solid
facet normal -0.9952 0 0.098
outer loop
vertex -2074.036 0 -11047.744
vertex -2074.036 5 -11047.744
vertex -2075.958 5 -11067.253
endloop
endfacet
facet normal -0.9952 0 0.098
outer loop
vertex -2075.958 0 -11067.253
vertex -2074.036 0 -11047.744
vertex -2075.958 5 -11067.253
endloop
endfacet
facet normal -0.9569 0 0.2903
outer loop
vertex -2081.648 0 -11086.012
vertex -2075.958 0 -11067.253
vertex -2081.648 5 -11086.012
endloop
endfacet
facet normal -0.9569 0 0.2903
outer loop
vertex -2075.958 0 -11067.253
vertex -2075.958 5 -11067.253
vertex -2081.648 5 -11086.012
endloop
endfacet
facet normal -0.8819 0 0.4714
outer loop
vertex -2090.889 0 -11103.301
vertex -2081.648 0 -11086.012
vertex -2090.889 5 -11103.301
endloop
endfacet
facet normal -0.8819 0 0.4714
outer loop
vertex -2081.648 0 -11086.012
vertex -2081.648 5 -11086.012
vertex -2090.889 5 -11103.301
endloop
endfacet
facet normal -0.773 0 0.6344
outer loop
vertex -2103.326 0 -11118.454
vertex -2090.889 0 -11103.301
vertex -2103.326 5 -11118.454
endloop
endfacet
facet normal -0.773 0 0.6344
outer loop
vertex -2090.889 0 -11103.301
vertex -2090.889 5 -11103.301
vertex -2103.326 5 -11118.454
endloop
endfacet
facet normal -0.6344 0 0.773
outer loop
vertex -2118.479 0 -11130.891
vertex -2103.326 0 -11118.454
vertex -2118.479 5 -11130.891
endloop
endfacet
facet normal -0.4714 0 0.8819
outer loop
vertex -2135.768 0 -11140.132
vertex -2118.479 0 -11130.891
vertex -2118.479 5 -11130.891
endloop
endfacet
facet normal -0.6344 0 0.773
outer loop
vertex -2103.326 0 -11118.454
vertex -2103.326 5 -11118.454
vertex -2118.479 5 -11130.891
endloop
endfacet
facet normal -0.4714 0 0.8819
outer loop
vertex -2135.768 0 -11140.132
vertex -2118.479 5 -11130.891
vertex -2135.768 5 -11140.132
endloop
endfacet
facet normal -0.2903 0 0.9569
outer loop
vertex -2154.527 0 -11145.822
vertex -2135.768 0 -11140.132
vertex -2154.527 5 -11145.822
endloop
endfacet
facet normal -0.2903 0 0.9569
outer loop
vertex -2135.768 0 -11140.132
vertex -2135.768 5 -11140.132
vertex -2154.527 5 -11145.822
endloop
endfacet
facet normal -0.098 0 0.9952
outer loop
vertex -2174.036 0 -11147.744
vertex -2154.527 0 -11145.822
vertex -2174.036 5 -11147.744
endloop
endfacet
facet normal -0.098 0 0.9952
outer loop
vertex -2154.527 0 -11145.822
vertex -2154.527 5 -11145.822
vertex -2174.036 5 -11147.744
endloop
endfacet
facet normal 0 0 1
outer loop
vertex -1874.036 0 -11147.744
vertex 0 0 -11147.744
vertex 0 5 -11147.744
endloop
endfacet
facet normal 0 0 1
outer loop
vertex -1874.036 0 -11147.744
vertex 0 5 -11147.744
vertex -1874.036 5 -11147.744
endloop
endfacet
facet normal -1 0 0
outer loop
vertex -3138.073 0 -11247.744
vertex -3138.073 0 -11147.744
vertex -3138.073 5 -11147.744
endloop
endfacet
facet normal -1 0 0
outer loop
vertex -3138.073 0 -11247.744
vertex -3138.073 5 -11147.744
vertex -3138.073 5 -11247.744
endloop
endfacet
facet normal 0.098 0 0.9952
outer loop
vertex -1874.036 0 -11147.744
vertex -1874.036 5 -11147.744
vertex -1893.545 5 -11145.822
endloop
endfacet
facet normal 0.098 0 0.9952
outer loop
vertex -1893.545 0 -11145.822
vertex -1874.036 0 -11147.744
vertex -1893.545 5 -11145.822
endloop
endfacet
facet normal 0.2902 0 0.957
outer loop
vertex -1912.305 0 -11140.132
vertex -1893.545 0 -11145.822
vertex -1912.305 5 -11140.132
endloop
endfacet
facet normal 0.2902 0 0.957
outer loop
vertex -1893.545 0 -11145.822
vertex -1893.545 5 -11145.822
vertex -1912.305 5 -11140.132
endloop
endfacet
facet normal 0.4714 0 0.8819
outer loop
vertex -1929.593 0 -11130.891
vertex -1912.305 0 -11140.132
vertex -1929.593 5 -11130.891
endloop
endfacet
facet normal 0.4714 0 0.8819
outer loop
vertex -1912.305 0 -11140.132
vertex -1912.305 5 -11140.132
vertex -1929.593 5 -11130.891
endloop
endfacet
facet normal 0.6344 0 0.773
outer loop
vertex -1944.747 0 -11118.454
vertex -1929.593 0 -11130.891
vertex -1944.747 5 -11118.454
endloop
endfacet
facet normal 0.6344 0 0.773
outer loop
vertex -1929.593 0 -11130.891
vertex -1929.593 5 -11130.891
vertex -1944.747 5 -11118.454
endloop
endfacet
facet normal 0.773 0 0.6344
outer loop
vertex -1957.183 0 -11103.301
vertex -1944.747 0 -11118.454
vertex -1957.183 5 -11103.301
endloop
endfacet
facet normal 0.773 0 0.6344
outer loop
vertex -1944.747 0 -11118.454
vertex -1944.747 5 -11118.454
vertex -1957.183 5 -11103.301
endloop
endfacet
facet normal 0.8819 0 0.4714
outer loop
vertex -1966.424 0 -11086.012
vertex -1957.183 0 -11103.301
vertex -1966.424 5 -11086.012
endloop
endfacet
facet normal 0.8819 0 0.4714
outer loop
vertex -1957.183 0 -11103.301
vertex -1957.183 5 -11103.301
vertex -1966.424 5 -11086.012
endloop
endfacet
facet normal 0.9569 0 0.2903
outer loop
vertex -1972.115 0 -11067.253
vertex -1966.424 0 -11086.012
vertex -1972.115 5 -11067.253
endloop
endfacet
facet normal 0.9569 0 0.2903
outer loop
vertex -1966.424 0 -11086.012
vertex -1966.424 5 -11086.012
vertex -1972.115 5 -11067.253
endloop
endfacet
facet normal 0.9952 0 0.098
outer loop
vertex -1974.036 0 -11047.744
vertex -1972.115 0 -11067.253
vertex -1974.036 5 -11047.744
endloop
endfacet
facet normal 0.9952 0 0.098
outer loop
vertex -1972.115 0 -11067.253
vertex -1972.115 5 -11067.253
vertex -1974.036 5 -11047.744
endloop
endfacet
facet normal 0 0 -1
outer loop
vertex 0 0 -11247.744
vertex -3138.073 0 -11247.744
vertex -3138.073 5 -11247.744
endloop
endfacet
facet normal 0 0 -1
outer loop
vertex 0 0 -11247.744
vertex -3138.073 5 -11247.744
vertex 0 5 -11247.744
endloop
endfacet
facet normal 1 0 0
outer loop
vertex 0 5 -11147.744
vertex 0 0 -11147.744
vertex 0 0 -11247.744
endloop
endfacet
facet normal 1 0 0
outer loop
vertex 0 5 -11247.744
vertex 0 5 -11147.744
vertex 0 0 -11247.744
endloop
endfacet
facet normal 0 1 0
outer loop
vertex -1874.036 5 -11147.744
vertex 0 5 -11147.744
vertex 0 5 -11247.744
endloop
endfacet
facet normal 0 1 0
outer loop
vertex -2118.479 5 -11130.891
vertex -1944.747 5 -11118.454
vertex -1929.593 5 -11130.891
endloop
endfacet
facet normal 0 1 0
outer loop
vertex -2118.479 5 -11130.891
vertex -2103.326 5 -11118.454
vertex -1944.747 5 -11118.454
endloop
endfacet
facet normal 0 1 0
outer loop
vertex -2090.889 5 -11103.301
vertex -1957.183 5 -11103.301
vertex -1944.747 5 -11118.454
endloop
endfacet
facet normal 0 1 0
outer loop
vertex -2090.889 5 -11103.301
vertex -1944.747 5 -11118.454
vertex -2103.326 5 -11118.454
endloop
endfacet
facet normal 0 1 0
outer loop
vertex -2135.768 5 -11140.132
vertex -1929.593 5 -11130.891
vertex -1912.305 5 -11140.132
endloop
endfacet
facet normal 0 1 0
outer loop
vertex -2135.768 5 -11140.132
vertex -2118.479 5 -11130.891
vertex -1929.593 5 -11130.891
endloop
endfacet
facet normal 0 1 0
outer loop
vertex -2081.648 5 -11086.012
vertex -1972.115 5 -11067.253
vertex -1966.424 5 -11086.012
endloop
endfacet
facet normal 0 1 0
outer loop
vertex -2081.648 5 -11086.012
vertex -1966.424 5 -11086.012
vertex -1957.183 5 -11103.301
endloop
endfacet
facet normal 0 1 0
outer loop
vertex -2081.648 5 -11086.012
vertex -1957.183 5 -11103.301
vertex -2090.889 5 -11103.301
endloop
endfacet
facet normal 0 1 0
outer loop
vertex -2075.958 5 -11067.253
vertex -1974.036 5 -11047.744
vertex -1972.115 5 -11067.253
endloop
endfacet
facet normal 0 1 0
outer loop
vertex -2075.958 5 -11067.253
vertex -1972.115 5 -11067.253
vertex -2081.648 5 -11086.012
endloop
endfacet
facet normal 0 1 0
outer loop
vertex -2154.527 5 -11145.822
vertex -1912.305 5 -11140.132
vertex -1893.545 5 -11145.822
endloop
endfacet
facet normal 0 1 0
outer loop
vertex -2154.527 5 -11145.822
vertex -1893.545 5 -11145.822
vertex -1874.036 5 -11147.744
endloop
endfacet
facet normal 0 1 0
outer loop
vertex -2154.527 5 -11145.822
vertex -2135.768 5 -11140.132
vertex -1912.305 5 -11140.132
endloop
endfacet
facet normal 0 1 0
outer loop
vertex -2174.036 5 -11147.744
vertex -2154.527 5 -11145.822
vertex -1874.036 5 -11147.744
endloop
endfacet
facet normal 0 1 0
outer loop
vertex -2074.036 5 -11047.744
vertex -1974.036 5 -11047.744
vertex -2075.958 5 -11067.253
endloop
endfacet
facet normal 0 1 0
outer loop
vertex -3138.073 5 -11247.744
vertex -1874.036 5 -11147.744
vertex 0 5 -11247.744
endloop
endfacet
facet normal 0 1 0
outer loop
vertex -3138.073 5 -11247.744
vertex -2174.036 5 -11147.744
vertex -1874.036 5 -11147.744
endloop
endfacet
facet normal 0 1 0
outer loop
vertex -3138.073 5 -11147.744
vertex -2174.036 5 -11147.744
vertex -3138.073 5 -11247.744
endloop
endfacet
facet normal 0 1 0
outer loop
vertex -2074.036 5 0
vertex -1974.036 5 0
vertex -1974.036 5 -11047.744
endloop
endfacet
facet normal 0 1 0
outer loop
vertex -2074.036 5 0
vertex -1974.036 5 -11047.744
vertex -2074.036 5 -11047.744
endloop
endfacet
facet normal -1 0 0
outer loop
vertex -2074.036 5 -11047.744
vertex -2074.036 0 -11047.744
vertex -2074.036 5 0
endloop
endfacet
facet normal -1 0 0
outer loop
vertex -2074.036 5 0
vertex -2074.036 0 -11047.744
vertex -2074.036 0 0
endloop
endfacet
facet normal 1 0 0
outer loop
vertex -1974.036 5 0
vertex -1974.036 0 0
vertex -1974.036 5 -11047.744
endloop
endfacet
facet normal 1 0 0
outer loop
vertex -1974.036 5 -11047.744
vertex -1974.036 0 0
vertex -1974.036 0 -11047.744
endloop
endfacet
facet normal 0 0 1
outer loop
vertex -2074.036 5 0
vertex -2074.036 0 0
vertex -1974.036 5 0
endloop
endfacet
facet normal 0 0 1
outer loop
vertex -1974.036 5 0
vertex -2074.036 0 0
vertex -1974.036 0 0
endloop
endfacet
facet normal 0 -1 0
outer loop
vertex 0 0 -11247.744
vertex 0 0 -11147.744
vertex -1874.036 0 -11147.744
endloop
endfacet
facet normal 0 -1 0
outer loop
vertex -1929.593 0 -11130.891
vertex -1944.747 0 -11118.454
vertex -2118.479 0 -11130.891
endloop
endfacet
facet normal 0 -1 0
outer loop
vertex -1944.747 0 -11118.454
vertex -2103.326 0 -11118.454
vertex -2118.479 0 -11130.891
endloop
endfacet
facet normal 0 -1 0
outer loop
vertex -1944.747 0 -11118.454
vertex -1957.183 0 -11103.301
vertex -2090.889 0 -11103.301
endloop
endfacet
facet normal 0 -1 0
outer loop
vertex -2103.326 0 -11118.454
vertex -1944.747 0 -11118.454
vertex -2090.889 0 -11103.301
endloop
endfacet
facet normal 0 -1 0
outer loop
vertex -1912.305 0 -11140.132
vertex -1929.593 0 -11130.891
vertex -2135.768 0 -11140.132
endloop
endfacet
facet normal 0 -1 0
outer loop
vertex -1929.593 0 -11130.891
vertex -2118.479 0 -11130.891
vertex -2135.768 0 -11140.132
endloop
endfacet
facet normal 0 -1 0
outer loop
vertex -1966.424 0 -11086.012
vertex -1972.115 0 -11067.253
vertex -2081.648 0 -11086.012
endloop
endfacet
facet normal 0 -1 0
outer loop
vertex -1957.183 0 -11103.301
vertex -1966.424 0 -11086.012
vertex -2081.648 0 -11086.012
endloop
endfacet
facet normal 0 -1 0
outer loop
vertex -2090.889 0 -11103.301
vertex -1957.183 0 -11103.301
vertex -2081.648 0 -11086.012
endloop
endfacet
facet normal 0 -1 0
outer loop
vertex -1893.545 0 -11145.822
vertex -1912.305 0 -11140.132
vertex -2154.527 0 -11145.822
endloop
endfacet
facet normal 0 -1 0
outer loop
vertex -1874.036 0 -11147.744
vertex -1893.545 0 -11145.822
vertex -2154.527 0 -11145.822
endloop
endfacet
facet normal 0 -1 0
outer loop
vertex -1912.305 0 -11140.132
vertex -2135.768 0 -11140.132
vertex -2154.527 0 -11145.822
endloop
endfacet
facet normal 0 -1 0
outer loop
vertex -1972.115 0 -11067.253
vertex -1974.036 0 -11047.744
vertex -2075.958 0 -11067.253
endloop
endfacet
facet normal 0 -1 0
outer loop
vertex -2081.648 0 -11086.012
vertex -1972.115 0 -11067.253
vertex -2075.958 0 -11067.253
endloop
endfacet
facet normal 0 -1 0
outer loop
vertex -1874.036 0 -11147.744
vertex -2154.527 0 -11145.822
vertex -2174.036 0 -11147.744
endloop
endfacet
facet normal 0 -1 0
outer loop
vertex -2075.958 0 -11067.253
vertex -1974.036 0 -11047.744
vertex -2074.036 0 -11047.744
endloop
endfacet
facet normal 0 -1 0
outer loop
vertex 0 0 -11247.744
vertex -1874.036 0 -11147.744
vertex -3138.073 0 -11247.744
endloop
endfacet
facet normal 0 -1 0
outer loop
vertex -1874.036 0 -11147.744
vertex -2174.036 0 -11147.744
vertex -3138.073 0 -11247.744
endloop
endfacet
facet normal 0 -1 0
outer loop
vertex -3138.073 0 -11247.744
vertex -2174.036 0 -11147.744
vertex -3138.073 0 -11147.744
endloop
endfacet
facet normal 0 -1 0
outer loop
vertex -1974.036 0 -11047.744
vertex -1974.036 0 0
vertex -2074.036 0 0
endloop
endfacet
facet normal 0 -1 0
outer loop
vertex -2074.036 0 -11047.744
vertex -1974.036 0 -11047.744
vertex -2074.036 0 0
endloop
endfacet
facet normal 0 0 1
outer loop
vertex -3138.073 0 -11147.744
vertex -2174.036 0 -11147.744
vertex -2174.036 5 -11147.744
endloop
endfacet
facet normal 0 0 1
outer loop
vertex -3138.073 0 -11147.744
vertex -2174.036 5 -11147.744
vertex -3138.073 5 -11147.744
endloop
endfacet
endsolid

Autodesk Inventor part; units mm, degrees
ref_plane "YZ Plane" through (0, 0, 0) normal (1, 0, 0) x (0, 1, 0)
ref_plane "XZ Plane" through (0, 0, 0) normal (0, 1, 0) x (-1, 0, 0)
ref_plane "XY Plane" through (0, 0, 0) normal (0, 0, 1) x (1, 0, 0)
sketch "Sketch1" plane through (0, 0, 0) normal (0, 1, 0) x (-1, 0, 0)
  line L0 (1974.0363, 0) -> (1974.0363, -11147.7438)
  line L1 (1974.0363, -11147.7438) -> (2074.0363, -11147.7438)
  line L2 (2074.0363, -11147.7438) -> (2074.0363, 0)
  line L3 (0, 0) -> (0, -12000)
  line L4 (3138.0727, -11247.7438) -> (0, -11247.7438)
  line L5 (0, -11247.7438) -> (0, -11147.7438)
  line L6 (0, -11147.7438) -> (3138.0727, -11147.7438)
  line L7 (3138.0727, -11147.7438) -> (3138.0727, -11247.7438)
  line L8 (3138.0727, 0) -> (3138.0727, -12000)
  line L9 (2074.0363, 0) -> (1974.0363, 0)
  point P0 (1974.0363, -9581.3845)
  point P1 (2074.0363, -9581.3845)
  dimension "d0" = 100
extrude "Extrusion1" add sketch "Sketch1" along normal blind 5
fillet "Fillet1" radius 100 2 edges at (-1974.0363, 2.5, -11147.7438) (-2074.0363, 2.5, -11147.7438)
properties part number "FloorStripe"
